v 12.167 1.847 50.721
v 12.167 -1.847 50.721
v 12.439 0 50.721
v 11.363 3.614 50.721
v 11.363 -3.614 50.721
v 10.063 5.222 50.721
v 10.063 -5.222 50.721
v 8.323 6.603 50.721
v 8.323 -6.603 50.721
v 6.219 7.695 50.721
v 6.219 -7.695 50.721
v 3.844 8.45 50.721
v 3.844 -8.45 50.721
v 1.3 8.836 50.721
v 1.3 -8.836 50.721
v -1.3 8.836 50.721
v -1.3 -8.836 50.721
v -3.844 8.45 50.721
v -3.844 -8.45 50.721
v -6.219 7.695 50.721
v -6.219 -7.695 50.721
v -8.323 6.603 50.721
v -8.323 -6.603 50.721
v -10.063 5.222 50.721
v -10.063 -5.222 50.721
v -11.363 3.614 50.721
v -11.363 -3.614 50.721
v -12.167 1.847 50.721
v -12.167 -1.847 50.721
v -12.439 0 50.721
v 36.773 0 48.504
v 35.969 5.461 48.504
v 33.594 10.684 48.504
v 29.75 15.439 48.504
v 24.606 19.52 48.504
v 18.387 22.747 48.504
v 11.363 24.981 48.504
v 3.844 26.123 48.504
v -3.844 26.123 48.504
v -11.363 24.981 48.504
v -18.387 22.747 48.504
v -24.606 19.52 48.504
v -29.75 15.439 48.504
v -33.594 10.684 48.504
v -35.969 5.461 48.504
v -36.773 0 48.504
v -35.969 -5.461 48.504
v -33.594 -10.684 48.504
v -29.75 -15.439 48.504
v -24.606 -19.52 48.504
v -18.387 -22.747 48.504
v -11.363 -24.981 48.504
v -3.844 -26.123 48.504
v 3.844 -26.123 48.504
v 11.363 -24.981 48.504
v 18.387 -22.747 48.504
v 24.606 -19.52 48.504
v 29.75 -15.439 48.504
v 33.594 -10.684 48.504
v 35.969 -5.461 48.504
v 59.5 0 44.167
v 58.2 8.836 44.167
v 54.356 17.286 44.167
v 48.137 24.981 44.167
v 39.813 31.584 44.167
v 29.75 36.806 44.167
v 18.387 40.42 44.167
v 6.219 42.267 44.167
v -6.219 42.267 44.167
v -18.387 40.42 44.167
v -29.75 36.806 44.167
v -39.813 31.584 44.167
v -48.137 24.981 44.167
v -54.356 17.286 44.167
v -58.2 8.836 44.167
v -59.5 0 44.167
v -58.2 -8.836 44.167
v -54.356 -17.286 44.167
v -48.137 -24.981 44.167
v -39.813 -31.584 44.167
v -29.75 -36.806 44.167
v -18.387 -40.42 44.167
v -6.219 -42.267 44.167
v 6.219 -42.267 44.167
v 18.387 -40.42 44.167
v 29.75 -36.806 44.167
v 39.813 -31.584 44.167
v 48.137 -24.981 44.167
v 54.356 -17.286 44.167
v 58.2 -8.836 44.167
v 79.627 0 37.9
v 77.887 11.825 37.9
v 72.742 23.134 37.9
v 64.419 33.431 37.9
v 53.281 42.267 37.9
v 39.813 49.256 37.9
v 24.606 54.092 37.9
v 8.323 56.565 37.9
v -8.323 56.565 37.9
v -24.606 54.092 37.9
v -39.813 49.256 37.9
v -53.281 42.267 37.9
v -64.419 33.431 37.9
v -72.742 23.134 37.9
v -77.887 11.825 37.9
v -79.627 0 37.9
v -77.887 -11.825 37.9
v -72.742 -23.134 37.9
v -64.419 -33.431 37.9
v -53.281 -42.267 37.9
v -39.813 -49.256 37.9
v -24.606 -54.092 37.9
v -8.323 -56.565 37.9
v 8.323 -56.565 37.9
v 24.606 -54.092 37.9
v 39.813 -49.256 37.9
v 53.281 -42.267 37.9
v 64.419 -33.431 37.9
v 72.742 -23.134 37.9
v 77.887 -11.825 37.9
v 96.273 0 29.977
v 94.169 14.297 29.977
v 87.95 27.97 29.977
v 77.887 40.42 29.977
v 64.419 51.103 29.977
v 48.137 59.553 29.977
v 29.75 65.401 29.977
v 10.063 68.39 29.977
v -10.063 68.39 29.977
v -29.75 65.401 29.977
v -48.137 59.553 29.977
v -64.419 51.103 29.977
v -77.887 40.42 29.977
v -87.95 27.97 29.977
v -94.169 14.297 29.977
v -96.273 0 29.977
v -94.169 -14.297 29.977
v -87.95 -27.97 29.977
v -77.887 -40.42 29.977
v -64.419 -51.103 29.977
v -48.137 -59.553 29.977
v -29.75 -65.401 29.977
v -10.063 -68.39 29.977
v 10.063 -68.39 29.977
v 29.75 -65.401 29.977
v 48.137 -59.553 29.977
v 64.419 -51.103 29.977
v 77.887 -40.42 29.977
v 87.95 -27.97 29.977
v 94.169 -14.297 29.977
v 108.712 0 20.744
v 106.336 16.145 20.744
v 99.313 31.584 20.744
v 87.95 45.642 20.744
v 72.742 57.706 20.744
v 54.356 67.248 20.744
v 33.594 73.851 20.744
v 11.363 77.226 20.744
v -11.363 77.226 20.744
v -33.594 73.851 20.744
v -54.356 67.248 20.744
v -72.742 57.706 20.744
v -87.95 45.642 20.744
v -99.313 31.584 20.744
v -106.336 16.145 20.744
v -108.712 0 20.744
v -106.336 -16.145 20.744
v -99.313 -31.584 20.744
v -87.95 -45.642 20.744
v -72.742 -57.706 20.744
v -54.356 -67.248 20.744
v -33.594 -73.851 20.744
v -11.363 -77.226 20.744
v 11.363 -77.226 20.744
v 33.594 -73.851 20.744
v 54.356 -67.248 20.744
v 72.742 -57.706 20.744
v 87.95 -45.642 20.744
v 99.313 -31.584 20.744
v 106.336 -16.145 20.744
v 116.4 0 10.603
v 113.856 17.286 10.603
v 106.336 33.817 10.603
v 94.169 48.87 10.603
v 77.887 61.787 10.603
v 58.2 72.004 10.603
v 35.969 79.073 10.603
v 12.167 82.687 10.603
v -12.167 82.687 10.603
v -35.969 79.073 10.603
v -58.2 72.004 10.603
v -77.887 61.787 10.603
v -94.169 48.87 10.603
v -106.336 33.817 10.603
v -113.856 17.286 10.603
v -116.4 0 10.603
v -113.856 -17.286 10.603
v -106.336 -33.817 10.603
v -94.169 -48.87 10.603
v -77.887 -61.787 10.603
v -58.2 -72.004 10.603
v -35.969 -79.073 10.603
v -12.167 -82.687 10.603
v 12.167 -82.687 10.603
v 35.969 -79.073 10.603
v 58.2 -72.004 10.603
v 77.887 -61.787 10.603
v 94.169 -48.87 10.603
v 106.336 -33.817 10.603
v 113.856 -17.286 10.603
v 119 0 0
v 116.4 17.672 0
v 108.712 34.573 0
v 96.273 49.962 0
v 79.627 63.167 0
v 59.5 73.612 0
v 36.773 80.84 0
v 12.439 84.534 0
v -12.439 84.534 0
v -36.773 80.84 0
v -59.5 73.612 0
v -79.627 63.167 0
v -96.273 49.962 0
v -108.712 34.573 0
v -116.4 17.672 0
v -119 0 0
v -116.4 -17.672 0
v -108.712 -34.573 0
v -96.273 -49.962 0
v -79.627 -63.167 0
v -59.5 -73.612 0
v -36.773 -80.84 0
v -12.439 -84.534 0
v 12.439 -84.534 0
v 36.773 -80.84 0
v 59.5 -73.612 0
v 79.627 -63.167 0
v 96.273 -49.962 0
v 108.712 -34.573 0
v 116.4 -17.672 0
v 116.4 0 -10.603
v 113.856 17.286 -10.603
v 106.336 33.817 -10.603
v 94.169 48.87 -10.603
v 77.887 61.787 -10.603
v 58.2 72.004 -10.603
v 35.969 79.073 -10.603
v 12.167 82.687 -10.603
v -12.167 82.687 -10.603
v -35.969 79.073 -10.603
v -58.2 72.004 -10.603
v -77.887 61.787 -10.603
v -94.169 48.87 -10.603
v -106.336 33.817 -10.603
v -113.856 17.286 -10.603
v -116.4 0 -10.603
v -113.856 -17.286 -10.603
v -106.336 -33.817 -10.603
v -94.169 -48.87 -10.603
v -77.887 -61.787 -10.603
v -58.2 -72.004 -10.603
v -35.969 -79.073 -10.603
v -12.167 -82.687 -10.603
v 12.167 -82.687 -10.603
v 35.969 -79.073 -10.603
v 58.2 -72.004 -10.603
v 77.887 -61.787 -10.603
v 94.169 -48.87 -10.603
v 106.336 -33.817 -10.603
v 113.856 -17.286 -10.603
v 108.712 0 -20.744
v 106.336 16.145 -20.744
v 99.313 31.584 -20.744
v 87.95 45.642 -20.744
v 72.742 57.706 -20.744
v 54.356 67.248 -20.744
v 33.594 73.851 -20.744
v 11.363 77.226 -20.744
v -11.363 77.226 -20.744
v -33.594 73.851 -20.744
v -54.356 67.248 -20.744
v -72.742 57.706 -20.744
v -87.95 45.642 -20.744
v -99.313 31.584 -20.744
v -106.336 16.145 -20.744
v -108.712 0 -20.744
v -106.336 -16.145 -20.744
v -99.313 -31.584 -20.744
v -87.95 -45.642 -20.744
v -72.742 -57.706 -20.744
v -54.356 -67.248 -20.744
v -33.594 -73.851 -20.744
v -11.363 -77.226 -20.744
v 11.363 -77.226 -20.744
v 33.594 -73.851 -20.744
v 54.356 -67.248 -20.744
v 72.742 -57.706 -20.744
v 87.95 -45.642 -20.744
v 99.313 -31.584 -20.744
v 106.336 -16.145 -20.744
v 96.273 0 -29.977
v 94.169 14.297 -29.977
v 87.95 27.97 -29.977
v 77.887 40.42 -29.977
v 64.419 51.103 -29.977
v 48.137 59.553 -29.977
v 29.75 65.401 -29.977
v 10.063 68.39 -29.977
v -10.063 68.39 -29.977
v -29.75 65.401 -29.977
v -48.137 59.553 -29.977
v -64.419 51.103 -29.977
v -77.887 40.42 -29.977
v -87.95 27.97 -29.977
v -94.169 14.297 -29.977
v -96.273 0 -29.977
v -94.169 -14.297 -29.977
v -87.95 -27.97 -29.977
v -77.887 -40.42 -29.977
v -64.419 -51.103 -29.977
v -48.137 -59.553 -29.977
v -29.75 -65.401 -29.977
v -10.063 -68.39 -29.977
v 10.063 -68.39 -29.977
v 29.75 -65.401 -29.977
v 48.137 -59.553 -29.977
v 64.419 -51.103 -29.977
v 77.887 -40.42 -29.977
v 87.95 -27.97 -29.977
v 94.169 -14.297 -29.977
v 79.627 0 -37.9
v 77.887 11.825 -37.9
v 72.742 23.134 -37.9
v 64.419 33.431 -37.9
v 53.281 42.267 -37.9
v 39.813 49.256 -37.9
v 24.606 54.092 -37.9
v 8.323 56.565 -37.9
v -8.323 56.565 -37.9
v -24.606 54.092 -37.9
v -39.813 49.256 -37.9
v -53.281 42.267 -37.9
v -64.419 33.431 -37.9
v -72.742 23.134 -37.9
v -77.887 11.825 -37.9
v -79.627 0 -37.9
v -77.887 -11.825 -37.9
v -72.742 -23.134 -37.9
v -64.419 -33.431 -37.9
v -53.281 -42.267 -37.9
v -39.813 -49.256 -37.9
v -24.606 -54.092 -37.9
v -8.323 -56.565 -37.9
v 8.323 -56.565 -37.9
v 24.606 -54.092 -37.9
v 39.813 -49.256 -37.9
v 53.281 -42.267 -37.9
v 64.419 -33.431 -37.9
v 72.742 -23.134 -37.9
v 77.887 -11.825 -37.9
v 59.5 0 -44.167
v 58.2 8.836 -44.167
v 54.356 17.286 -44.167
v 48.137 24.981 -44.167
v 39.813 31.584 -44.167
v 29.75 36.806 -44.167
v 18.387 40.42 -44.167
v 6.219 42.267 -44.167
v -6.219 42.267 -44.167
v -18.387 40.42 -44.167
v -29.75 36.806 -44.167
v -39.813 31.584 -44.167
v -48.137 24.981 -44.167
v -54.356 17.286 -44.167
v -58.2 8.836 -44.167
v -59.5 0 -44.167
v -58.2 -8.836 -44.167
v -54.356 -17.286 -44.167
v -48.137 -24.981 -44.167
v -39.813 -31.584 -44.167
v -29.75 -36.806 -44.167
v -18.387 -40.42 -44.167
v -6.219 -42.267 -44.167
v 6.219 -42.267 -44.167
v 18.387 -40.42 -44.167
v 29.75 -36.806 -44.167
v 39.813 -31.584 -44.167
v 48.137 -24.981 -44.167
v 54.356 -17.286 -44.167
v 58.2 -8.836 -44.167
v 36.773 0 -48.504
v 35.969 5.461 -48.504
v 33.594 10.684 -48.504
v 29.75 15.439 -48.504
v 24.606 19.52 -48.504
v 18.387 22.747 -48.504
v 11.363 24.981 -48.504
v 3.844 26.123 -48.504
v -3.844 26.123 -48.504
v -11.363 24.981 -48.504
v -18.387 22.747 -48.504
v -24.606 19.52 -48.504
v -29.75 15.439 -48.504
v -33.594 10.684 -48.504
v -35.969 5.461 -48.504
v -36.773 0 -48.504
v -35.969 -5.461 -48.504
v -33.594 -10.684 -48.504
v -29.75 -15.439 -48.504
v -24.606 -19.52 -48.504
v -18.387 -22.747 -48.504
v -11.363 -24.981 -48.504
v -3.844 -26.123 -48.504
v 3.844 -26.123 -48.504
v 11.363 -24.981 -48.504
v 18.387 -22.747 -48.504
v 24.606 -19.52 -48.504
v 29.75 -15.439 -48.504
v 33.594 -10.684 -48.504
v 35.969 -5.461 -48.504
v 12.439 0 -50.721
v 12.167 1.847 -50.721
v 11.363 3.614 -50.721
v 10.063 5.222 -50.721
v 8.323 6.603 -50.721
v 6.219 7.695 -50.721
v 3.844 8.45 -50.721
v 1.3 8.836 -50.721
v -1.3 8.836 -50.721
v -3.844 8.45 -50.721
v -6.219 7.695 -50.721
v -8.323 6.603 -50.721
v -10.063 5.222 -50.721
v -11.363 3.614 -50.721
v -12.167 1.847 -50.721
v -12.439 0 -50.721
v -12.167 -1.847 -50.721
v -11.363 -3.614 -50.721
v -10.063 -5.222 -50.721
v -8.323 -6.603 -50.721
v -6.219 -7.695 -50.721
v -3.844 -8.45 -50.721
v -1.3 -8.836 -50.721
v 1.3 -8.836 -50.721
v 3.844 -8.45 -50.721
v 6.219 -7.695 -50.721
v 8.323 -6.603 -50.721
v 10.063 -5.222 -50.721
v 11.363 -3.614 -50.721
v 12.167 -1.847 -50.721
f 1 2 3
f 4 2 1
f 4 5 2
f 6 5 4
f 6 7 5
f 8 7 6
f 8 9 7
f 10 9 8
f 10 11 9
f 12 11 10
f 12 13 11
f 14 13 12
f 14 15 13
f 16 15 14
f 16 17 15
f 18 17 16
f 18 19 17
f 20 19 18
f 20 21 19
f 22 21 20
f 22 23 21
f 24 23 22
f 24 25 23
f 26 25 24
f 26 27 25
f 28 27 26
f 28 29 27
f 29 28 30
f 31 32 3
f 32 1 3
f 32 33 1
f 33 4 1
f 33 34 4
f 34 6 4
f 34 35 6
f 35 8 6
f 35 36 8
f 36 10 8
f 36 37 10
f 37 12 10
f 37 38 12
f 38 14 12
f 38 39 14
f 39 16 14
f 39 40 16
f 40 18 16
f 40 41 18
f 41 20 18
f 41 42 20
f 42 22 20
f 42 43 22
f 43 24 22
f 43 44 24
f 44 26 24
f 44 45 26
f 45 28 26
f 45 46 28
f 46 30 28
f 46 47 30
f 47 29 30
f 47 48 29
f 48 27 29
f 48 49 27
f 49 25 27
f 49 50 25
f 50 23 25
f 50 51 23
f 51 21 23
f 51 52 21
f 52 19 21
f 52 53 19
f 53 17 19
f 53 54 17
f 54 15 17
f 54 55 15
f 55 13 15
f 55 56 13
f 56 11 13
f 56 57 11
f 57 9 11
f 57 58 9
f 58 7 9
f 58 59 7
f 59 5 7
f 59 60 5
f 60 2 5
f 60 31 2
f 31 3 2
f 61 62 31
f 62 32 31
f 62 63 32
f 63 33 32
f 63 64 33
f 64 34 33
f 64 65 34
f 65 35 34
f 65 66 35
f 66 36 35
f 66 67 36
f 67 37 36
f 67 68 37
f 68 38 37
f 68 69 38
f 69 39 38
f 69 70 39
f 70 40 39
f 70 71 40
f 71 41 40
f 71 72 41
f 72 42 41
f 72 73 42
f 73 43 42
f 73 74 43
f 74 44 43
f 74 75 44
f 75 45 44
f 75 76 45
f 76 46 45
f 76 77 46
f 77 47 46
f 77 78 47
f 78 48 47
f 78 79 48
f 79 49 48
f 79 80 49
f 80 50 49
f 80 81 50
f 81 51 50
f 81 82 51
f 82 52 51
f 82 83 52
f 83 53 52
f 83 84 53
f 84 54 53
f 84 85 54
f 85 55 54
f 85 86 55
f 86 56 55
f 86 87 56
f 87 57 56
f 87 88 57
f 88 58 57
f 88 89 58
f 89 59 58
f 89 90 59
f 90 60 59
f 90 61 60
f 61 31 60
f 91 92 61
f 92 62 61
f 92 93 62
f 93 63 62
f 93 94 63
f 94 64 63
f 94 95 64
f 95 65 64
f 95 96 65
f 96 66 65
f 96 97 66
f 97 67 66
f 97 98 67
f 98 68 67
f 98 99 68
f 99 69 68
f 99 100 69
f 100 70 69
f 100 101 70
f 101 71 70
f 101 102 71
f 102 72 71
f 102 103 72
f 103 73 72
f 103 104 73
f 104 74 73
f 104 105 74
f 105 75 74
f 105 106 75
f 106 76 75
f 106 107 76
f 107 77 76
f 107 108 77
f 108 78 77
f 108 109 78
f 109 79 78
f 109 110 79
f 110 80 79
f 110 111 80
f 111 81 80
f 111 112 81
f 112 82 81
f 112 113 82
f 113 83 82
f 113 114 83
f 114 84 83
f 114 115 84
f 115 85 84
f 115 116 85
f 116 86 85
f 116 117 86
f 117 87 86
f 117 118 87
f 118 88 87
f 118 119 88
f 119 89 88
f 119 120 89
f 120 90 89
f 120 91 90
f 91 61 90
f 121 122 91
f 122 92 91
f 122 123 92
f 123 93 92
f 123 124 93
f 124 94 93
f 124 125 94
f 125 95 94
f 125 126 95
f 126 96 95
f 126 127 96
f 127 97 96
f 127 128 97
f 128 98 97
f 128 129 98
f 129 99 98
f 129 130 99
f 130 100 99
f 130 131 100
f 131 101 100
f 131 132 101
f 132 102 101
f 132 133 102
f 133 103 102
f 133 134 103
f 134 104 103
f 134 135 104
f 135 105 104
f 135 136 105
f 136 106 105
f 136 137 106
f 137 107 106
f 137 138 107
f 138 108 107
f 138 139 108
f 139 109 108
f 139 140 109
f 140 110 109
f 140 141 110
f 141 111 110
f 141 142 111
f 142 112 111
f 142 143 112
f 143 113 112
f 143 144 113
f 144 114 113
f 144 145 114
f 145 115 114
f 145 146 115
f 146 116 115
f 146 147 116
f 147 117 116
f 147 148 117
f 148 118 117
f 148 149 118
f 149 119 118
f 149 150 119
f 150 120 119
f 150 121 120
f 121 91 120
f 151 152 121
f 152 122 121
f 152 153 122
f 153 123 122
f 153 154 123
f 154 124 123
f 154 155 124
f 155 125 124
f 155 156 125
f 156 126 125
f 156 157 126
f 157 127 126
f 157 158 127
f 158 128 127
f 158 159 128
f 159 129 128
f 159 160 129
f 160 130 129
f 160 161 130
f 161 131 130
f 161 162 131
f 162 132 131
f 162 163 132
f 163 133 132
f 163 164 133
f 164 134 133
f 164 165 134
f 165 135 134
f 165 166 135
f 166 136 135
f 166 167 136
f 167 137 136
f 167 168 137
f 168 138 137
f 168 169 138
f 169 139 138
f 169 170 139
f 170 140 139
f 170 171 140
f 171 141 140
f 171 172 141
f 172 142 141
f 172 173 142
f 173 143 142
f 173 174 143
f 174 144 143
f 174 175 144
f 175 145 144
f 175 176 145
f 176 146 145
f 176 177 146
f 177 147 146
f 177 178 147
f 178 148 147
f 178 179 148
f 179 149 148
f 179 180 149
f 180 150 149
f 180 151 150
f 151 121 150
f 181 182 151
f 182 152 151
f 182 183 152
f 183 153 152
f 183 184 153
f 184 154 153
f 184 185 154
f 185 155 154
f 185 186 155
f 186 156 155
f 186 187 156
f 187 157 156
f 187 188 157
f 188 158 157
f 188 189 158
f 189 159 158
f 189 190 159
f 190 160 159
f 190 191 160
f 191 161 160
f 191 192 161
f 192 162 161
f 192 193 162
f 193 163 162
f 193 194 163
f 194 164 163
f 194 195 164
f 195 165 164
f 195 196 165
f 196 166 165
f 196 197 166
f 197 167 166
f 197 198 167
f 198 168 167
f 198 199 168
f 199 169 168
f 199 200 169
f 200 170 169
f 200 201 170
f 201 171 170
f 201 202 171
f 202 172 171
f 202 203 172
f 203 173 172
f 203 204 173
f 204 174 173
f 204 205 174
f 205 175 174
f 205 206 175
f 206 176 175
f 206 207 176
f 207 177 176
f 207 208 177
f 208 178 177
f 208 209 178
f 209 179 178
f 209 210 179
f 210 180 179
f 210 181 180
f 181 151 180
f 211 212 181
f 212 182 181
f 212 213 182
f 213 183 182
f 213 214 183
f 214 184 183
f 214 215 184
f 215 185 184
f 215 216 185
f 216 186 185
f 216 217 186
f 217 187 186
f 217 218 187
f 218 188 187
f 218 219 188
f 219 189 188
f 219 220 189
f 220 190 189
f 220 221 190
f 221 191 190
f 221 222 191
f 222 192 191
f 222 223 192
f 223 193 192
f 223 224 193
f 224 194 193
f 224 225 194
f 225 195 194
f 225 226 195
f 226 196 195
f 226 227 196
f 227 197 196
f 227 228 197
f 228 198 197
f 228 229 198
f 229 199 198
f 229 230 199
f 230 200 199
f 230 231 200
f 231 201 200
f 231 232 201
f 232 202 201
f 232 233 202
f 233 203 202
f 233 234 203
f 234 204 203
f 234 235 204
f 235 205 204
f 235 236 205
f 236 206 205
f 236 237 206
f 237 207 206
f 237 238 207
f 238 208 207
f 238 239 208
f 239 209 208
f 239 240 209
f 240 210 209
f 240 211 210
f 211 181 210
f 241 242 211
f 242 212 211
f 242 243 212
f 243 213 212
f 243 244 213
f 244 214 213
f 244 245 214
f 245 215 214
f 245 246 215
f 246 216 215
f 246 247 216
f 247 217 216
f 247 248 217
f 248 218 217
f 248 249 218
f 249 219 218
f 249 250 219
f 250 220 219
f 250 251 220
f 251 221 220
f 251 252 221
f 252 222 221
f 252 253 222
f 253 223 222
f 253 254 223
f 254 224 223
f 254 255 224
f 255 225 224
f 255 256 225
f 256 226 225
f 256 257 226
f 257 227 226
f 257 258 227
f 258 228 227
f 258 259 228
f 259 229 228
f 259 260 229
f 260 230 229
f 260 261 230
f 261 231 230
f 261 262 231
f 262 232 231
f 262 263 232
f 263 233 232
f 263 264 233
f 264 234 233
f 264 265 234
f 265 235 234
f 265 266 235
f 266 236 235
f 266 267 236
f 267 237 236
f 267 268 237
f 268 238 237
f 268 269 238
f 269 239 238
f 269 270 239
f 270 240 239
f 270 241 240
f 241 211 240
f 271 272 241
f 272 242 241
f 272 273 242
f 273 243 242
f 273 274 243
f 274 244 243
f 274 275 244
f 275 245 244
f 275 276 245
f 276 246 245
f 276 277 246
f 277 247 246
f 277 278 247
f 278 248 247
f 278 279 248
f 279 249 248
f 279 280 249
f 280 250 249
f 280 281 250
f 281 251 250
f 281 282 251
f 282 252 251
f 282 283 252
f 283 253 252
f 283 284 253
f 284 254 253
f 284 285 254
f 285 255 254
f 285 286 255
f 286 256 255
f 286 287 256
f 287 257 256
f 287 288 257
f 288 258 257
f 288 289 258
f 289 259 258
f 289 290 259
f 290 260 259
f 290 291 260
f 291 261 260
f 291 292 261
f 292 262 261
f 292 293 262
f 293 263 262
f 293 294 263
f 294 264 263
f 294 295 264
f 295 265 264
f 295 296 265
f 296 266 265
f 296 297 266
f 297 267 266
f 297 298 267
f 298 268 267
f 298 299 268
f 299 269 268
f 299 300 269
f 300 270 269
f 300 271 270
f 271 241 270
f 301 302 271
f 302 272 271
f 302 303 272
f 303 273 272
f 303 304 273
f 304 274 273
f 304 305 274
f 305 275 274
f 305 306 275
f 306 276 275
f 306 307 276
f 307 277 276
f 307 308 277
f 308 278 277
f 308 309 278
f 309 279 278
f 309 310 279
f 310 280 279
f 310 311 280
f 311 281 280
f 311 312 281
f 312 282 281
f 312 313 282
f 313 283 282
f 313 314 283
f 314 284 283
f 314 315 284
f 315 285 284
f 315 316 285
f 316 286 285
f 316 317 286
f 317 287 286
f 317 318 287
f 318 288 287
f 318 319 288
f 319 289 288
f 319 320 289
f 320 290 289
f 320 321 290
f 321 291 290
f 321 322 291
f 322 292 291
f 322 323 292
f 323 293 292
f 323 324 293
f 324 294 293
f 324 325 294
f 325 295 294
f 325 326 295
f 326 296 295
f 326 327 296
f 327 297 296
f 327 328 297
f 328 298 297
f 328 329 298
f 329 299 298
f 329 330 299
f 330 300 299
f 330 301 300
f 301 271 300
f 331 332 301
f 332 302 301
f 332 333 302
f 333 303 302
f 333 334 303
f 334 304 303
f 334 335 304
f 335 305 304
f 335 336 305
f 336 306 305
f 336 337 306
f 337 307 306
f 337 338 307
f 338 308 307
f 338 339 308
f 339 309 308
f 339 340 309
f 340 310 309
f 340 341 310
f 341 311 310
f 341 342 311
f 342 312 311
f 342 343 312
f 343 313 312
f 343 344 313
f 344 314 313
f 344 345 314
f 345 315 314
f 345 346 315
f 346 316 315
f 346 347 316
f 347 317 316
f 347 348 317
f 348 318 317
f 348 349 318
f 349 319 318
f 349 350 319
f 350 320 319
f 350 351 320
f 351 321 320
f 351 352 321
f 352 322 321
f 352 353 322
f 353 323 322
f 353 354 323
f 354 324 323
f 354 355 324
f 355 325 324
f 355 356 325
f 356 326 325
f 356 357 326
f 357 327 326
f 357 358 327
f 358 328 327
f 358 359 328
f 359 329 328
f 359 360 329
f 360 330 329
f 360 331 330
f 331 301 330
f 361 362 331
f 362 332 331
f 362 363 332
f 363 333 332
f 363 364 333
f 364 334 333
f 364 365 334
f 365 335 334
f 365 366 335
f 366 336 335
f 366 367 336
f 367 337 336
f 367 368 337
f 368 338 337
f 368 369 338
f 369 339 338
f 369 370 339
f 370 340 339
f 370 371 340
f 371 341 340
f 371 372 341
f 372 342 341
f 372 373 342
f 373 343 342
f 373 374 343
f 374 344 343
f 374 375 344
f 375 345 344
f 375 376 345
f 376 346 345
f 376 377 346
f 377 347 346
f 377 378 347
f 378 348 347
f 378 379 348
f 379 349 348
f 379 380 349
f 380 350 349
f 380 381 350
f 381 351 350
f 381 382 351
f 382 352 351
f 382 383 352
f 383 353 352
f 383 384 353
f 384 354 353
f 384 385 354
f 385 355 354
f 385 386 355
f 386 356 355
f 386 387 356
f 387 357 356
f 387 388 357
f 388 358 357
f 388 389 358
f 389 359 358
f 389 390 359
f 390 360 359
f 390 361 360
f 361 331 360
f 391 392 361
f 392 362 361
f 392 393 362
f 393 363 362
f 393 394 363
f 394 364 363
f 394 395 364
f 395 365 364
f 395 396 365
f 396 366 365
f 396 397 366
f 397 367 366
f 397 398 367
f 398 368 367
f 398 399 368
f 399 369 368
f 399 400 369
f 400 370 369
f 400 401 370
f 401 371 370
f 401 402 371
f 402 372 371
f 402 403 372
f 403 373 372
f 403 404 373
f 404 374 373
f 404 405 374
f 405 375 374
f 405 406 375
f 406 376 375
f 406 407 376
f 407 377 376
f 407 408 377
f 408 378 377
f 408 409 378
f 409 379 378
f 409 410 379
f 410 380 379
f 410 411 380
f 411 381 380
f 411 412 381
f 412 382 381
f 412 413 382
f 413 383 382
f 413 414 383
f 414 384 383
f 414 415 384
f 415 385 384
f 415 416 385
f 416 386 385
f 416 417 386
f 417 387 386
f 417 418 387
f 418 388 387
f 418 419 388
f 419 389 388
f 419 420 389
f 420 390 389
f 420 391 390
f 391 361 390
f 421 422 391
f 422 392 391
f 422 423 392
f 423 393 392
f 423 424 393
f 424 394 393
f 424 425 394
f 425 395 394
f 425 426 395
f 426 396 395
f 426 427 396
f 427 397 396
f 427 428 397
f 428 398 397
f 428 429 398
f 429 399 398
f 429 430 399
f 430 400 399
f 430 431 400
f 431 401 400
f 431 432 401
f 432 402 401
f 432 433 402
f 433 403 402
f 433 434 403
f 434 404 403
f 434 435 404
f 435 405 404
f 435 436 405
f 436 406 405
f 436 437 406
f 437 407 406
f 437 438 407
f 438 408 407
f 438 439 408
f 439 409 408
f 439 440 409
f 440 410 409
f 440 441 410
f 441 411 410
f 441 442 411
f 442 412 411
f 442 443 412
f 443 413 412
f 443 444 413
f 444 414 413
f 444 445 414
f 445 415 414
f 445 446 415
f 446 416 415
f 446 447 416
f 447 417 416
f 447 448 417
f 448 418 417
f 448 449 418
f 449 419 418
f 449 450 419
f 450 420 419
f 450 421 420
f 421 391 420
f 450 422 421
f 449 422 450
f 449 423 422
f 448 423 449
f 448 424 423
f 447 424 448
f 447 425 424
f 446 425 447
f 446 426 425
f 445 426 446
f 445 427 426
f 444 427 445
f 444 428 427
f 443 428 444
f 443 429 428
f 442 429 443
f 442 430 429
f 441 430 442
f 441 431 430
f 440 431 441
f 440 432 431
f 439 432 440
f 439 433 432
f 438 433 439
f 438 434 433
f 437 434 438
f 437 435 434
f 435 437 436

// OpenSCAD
// Generated by SolidPython 1.0.1 on 2020-07-29 00:46:47


scale(v = [7, 5, 3]) {
	sphere(r = 17);
}
/***********************************************
*********      SolidPython code:      **********
************************************************
 
# import packages: SolidPython
from solid import *
from solid.utils import *
from itertools import chain, combinations, permutations


class Resize:

    def __init__(self, scad_file):
        self.scad_file = scad_file
        #self.scad_file = import_scad(scad_file)
        # cone/cylinder param:
        self.r1 = 0
        self.r2 = 0
        self.h = 0
        # rectangular prism param:
        self.w = 0
        self.l = 0
        # ellipse param:
        self.r = 0

    # import OpenScad code (file name corresponds to shape)


    # classify shape + parameters
    def assign(self, param1, param2, param3):
        if self.scad_file == 'cone.scad':
            self.r1 = param1
            self.r2 = param2
            self.h = param3
        elif self.scad_file == 'cylinder.scad':
            self.r1 = param1
            self.r2 = param2
            self.h = param3
        elif self.scad_file == 'rectangularPrism.scad':
            self.h = param1
            self.l = param2
            self.w = param3
        else:
            self.r = param1
            self.h = param2

    # resize parameters
    def iterate(self):
        x = range(3, 20, 2)
        i = 1
        if self.scad_file == 'cone.scad':
            tempList = list(permutations(x, 2))
            for temp in tempList:
                param1 = temp[0]
                param2 = temp[1]
                filepath = 'produced_scad_files/' + 'cone' + str(param1) + '_' + str(param2) + '_' + '.scad'
                scad_render_to_file(cylinder(h=param1, r1=param2, r2=0), filepath)

        elif self.scad_file == 'cylinder.scad':
            tempList = list(permutations(x, 3))
            for temp in tempList:
                param1 = temp[0]
                param2 = temp[1]
                filepath = 'produced_scad_files/' + 'cylinder' + str(param1) + '_' + str(param2) + '_' + '.scad'
                scad_render_to_file(cylinder(h=param1, r1=param2, r2=param2), filepath)

        elif self.scad_file == 'rectangularPrism.scad':
            tempList = list(permutations(x, 3))
            for temp in tempList:
                param1 = temp[0]
                param2 = temp[1]
                param3 = temp[2]
                filepath = 'produced_scad_files/' + 'rectangularPrism' + str(param1) + '_' + str(param2) + '_' + str(
                    param3) + '.scad'
                scad_render_to_file(cube(size=(param1, param2, param3)), filepath)

        elif self.scad_file == 'ellipse.scad':
            tempList = list(permutations(x, 4))
            for temp in tempList:
                param1 = temp[0]
                param2 = temp[1]
                param3 = temp[2]
                param4 = temp[3]
                filepath = 'produced_scad_files/' + 'ellipse' + str(param1) + '_' + str(param2) + '_' + str(param3) + '_' + str(param4) + '.scad'
                scad_render_to_file(scale([param1, param2, param3])(sphere(r=param4)), filepath)

    def render_to_scadfile(self):
        scad_render_to_file(scad, 'example.scad') 
 
************************************************/
